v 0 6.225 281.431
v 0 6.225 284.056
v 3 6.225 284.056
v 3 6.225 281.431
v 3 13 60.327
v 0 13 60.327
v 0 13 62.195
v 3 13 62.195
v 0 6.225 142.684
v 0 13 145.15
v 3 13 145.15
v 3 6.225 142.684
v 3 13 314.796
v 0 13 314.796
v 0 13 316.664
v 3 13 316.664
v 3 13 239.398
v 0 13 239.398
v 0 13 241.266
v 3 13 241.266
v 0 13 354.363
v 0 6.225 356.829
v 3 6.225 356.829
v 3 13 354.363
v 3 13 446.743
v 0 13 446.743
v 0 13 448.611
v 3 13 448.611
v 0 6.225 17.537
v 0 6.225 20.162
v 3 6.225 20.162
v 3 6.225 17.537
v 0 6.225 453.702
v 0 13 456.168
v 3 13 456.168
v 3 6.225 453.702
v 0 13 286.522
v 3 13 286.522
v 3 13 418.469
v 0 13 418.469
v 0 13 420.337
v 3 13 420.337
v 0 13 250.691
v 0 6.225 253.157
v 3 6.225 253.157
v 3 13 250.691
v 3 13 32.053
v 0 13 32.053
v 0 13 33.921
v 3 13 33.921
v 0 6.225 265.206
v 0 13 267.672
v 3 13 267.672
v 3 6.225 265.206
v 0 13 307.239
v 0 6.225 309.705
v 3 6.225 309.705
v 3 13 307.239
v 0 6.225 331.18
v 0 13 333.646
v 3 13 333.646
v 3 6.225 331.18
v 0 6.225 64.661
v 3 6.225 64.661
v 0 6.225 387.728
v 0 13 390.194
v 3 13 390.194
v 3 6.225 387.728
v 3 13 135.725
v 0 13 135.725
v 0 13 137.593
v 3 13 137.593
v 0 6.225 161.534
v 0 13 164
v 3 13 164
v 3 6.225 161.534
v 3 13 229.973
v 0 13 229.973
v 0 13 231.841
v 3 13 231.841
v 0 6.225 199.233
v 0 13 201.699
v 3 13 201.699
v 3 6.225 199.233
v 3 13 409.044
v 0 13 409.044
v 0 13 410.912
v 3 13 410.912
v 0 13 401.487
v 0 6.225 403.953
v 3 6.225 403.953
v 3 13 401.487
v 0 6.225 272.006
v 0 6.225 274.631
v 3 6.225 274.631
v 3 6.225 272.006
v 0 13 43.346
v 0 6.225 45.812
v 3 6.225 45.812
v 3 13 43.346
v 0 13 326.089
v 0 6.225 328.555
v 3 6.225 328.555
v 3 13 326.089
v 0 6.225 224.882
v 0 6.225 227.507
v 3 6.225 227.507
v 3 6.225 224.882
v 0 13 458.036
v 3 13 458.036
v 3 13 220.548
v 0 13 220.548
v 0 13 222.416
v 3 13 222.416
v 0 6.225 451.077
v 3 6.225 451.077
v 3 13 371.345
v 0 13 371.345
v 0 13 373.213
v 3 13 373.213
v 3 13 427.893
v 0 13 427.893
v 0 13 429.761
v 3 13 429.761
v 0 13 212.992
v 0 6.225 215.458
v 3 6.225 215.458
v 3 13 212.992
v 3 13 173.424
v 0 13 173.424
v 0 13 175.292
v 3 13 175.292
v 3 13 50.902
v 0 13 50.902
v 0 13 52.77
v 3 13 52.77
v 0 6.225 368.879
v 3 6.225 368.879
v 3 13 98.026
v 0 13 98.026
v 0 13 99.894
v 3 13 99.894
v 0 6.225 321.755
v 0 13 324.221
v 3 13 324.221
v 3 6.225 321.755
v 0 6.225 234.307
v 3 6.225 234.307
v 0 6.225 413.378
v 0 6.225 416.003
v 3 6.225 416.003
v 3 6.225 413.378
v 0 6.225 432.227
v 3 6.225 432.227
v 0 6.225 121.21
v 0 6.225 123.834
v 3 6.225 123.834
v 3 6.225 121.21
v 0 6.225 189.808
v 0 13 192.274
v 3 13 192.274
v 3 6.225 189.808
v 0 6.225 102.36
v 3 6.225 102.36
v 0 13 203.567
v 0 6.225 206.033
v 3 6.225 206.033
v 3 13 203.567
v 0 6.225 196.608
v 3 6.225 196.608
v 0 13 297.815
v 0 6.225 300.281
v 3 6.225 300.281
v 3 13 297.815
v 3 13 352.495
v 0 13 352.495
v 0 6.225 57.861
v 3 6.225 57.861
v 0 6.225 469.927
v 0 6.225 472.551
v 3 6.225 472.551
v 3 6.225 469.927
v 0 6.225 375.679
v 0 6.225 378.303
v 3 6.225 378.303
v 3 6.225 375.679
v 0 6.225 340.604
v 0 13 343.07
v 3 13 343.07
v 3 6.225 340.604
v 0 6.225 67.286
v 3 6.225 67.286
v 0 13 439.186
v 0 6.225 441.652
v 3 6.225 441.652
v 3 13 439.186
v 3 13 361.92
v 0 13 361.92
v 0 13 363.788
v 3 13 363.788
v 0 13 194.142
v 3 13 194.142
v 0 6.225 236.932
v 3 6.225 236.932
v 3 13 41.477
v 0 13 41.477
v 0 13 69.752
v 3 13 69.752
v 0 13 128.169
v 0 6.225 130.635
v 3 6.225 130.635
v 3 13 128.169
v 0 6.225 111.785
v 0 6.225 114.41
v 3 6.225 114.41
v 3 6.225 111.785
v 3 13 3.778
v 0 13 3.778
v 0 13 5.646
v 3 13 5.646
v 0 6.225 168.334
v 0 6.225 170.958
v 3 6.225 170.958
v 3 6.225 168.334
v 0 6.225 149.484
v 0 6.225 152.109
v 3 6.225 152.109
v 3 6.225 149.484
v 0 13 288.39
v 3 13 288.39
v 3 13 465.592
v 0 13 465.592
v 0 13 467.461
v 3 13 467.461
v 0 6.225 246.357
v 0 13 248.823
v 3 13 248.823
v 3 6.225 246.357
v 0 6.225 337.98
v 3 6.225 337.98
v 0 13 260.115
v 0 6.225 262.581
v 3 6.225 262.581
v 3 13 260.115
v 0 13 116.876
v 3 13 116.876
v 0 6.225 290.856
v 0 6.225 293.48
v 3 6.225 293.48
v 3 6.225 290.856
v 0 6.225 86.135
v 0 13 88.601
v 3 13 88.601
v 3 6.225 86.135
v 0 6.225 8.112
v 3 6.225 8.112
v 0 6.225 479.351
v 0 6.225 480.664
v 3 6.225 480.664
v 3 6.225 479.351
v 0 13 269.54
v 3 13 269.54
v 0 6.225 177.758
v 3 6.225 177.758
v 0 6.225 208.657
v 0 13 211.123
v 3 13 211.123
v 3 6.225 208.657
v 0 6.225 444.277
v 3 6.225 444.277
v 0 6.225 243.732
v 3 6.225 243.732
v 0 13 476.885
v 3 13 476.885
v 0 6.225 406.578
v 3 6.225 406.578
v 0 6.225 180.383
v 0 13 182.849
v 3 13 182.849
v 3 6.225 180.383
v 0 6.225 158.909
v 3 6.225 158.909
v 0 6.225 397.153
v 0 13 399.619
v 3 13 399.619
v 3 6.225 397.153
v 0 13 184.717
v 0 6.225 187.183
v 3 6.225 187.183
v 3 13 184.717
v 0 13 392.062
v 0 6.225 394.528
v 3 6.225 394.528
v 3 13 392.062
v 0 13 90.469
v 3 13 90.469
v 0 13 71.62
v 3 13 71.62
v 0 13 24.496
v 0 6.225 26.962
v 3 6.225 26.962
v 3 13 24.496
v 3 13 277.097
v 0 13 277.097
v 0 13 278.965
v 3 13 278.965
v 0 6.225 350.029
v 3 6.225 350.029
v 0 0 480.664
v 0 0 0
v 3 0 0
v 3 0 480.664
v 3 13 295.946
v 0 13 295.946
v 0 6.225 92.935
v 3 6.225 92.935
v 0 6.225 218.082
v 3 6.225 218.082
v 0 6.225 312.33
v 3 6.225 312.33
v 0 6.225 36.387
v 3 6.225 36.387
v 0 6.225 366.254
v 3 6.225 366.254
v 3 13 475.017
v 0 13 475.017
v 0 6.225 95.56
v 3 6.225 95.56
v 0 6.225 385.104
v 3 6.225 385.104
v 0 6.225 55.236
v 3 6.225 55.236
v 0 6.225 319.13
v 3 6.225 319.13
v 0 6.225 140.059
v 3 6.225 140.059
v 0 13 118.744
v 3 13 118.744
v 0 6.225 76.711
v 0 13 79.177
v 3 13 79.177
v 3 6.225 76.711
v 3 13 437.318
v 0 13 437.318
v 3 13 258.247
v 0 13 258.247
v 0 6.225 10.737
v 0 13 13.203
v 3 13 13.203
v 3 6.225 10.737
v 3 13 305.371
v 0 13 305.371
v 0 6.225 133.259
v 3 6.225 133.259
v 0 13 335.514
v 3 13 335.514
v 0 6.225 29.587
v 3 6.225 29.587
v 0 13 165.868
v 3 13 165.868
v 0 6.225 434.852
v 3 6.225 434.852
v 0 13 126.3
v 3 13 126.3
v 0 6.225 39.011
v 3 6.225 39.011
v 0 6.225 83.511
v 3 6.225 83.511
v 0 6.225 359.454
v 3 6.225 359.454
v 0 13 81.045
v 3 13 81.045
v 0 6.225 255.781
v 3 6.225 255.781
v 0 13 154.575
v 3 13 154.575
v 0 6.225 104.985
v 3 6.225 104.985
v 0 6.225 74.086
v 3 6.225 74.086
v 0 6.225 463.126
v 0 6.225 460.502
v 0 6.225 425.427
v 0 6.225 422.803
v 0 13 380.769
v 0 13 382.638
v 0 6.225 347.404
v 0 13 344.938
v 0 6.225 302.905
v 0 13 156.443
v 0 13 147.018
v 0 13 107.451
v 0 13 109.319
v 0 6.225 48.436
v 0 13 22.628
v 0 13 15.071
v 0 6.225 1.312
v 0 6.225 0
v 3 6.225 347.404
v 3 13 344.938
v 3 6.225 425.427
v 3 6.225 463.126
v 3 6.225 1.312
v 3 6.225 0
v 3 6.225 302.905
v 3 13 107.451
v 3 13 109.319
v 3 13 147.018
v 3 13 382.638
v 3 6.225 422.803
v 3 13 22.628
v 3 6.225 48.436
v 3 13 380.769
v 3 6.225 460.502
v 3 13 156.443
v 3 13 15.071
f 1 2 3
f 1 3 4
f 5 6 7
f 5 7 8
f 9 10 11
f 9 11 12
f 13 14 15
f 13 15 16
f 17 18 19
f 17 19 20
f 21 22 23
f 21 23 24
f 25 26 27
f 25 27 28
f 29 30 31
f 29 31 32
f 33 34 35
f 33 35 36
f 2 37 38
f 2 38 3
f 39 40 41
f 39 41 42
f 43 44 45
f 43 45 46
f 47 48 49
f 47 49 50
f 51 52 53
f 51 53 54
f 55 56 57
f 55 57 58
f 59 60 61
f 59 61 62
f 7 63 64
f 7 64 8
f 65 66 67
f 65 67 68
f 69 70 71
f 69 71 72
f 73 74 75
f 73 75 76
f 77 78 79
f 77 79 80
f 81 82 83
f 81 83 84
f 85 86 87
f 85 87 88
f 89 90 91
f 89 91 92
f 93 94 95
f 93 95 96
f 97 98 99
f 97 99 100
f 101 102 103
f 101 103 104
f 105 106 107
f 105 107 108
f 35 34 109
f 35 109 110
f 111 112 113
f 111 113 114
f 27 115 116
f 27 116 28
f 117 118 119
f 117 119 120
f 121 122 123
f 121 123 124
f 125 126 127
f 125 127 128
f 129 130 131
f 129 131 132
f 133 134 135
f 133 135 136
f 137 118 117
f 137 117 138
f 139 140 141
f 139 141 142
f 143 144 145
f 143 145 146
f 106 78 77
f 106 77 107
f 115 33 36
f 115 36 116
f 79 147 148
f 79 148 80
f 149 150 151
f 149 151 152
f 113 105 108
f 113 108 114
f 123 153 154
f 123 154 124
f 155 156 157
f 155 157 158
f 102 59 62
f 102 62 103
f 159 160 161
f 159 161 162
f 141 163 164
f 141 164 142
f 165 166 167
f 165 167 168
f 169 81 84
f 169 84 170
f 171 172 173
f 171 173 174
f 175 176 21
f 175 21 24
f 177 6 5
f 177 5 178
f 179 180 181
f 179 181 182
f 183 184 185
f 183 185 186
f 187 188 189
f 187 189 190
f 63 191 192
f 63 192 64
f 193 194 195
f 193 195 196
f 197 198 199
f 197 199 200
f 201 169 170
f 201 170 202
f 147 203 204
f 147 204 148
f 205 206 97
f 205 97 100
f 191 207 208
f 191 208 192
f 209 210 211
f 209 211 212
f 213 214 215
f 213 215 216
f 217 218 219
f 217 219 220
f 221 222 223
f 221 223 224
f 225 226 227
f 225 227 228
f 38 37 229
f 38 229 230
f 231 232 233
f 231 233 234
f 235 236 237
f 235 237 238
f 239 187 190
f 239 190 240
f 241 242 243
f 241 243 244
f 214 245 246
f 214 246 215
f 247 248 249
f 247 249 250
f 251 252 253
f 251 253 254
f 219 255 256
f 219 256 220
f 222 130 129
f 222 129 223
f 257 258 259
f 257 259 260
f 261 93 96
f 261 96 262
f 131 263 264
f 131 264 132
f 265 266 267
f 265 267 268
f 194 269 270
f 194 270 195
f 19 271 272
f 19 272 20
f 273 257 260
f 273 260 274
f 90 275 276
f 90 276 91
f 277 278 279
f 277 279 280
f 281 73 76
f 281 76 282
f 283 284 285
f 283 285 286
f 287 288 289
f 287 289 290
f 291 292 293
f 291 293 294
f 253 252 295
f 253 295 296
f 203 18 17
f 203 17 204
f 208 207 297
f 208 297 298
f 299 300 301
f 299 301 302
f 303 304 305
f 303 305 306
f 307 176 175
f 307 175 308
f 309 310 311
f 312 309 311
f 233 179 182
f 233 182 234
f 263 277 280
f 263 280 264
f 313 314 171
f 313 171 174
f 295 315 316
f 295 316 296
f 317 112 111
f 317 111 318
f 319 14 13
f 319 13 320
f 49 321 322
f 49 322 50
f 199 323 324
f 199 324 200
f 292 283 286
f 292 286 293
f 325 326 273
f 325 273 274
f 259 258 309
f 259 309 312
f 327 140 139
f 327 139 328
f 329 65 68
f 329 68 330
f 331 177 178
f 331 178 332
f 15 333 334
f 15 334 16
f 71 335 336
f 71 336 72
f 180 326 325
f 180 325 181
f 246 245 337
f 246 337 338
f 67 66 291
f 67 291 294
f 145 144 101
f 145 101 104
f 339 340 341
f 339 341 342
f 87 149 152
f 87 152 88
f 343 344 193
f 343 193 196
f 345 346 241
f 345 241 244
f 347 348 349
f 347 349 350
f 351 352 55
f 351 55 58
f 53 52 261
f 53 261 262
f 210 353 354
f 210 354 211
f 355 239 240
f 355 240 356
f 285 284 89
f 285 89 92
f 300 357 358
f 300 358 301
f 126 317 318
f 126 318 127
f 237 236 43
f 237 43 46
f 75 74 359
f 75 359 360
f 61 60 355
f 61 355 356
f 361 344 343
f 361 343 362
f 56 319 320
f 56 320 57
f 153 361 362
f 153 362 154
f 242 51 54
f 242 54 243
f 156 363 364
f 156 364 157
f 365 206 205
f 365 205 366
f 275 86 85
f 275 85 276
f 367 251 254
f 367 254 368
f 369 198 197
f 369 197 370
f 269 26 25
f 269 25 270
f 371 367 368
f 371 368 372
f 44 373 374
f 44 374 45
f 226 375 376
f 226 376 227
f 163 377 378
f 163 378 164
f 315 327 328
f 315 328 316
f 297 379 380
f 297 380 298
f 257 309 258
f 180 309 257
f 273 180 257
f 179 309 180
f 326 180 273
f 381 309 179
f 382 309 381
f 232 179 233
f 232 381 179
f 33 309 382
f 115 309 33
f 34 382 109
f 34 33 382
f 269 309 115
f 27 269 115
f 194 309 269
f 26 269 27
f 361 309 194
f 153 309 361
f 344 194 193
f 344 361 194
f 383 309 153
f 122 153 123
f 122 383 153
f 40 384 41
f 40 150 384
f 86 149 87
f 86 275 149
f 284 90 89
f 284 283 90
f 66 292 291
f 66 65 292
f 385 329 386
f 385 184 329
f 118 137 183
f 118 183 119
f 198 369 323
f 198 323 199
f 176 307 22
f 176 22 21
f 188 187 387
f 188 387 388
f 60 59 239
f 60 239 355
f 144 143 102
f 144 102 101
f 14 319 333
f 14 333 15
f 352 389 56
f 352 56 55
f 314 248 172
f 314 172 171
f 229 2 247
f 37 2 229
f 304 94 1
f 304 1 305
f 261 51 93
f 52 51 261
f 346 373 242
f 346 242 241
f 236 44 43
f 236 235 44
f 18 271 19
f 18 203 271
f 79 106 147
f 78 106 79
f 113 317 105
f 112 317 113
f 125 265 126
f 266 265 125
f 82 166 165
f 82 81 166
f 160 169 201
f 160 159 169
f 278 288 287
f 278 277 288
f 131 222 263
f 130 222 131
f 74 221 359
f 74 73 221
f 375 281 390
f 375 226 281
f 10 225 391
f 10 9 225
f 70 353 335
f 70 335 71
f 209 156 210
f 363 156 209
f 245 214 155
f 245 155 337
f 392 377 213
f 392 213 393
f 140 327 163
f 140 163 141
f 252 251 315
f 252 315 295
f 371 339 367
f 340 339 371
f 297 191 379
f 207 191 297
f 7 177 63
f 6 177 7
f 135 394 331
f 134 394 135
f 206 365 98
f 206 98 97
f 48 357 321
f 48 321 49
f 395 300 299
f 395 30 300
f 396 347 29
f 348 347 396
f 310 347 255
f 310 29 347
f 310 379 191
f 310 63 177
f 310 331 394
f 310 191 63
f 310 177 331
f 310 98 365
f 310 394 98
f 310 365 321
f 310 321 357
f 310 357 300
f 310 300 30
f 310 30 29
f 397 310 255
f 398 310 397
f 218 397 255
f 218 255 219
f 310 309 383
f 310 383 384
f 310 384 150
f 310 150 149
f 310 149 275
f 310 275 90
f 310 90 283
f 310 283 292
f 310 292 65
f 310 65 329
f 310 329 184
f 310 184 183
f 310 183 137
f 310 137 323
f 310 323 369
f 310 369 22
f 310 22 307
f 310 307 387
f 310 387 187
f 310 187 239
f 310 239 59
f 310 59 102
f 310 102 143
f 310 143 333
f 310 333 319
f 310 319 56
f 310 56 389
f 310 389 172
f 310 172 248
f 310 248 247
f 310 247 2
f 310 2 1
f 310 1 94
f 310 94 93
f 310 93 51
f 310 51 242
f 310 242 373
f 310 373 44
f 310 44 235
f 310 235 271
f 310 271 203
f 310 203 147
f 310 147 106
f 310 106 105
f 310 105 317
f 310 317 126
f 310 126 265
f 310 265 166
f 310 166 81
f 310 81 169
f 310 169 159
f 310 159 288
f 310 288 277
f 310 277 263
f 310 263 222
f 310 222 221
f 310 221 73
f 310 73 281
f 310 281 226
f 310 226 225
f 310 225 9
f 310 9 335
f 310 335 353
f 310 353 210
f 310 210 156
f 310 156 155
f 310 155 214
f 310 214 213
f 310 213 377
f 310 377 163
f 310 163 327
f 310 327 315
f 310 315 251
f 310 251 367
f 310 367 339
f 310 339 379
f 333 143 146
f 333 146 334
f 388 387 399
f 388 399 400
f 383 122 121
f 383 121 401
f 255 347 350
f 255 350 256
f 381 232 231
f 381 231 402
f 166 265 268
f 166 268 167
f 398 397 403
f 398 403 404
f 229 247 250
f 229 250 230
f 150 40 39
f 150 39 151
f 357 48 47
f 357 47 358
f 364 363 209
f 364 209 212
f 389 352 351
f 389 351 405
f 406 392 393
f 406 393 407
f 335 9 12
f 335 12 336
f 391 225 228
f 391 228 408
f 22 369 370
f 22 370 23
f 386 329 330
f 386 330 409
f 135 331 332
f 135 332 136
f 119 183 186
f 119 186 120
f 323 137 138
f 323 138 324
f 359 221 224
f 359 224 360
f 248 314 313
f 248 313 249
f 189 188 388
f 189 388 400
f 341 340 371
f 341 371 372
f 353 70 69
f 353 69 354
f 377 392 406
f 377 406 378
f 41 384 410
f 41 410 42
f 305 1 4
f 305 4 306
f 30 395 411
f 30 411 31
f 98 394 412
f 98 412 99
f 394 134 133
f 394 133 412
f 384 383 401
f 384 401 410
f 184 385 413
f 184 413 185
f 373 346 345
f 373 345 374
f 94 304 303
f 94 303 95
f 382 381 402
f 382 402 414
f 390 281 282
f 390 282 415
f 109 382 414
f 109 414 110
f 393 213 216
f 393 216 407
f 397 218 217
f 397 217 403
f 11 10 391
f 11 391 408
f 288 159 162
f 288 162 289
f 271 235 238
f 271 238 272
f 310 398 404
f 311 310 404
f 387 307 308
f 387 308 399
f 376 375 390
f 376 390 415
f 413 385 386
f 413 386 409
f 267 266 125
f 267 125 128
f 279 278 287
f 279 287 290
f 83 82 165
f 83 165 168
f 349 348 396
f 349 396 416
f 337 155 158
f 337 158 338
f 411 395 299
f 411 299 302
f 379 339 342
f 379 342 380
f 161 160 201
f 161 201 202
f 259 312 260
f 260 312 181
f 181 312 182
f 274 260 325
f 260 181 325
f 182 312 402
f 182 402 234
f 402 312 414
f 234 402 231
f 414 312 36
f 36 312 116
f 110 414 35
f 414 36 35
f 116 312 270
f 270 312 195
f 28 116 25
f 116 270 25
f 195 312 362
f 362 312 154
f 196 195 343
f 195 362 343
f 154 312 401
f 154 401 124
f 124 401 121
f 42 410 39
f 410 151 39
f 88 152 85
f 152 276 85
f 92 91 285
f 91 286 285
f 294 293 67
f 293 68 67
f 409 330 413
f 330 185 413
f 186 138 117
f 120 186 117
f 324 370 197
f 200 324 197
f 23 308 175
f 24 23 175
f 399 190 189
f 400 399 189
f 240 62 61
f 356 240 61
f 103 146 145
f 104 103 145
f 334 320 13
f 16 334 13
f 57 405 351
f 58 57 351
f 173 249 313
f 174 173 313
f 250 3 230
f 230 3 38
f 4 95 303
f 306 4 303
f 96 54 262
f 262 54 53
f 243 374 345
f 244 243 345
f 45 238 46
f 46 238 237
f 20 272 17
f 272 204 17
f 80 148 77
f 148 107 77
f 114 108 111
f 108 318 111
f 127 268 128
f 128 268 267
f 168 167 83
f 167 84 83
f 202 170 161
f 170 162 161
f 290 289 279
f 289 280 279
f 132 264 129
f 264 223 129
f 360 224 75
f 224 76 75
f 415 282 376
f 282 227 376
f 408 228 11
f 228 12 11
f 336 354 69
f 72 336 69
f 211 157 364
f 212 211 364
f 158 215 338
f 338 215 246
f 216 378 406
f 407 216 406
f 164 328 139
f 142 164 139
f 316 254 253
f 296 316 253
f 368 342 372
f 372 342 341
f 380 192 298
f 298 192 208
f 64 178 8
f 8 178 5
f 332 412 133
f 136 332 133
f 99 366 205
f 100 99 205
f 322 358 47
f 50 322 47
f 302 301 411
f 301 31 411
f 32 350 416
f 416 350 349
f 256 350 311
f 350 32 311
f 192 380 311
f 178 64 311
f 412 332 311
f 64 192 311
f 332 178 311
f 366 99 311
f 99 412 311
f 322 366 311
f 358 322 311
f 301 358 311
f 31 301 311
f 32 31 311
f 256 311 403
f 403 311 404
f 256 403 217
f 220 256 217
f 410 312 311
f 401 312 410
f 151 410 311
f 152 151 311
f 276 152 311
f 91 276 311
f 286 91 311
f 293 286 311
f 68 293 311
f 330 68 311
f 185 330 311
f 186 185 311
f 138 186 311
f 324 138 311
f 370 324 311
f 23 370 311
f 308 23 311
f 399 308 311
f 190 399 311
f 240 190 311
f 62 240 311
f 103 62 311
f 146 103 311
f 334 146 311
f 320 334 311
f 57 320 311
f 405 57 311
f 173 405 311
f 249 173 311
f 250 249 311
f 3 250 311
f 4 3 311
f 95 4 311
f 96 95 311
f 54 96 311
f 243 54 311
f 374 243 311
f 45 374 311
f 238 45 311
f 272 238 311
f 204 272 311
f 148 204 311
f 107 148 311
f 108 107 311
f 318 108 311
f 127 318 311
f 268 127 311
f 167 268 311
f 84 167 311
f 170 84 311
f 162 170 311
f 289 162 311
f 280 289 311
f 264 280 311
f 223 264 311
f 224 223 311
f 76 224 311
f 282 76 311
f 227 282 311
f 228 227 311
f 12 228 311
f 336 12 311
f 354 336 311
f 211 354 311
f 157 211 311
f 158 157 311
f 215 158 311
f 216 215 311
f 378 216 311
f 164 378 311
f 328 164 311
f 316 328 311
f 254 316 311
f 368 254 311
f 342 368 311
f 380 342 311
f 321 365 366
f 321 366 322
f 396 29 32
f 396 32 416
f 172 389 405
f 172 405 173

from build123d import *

# Parameters (mm, degrees)
ESBO_O1_W                = 3
ESBO_O1_H                = 13
RESSALTO_EXTRUS_O1_DEPTH = 480.664
CORTE_EXTRUS_O1_DEPTH    = 481.849124878


with BuildPart() as part:
    # Esboço1 → Ressalto-extrusão1 (new body)
    with BuildSketch(Plane.XY):
        with Locations((1.5, 6.5)):
            Rectangle(ESBO_O1_W, ESBO_O1_H)
    extrude(amount=RESSALTO_EXTRUS_O1_DEPTH)

    # Esboço2 → Corte-extrusão1 (cut, through all)
    with BuildSketch(Plane.ZY):
        Polygon((1.312306109, 6.2246), (-1.312306109, 6.2246), (-3.778350034, 13), (3.778350034, 13), align=None)
        Polygon((10.737084059, 6.2246), (8.112471841, 6.2246), (5.646427916, 13), (13.203127984, 13), align=None)
        Polygon((20.161862009, 6.2246), (17.537249791, 6.2246), (15.071205866, 13), (22.627905934, 13), align=None)
        Polygon((29.586639959, 6.2246), (26.962027741, 6.2246), (24.495983816, 13), (32.052683884, 13), align=None)
        Polygon((39.011417909, 6.2246), (36.386805691, 6.2246), (33.920761766, 13), (41.477461834, 13), align=None)
        Polygon((48.436195859, 6.2246), (45.811583641, 6.2246), (43.345539716, 13), (50.902239784, 13), align=None)
        Polygon((57.860973809, 6.2246), (55.236361591, 6.2246), (52.770317666, 13), (60.327017734, 13), align=None)
        Polygon((67.285751759, 6.2246), (64.661139541, 6.2246), (62.195095616, 13), (69.751795684, 13), align=None)
        Polygon((76.710529709, 6.2246), (74.085917491, 6.2246), (71.619873566, 13), (79.176573634, 13), align=None)
        Polygon((86.135307659, 6.2246), (83.510695441, 6.2246), (81.044651516, 13), (88.601351584, 13), align=None)
        Polygon((95.560085609, 6.2246), (92.935473391, 6.2246), (90.469429466, 13), (98.026129534, 13), align=None)
        Polygon((104.984863559, 6.2246), (102.360251341, 6.2246), (99.894207416, 13), (107.450907484, 13), align=None)
        Polygon((114.409641509, 6.2246), (111.785029291, 6.2246), (109.318985366, 13), (116.875685434, 13), align=None)
        Polygon((123.834419459, 6.2246), (121.209807241, 6.2246), (118.743763316, 13), (126.300463384, 13), align=None)
        Polygon((133.259197409, 6.2246), (130.634585191, 6.2246), (128.168541266, 13), (135.725241334, 13), align=None)
        Polygon((142.683975359, 6.2246), (140.059363141, 6.2246), (137.593319216, 13), (145.150019284, 13), align=None)
        Polygon((152.108753309, 6.2246), (149.484141091, 6.2246), (147.018097166, 13), (154.574797234, 13), align=None)
        Polygon((161.533531259, 6.2246), (158.908919041, 6.2246), (156.442875116, 13), (163.999575184, 13), align=None)
        Polygon((170.958309209, 6.2246), (168.333696991, 6.2246), (165.867653066, 13), (173.424353134, 13), align=None)
        Polygon((180.383087159, 6.2246), (177.758474941, 6.2246), (175.292431016, 13), (182.849131084, 13), align=None)
        Polygon((189.807865109, 6.2246), (187.183252891, 6.2246), (184.717208966, 13), (192.273909034, 13), align=None)
        Polygon((199.232643059, 6.2246), (196.608030841, 6.2246), (194.141986916, 13), (201.698686984, 13), align=None)
        Polygon((208.657421009, 6.2246), (206.032808791, 6.2246), (203.566764866, 13), (211.123464934, 13), align=None)
        Polygon((218.082198959, 6.2246), (215.457586741, 6.2246), (212.991542816, 13), (220.548242884, 13), align=None)
        Polygon((227.506976909, 6.2246), (224.882364691, 6.2246), (222.416320766, 13), (229.973020834, 13), align=None)
        Polygon((236.931754859, 6.2246), (234.307142641, 6.2246), (231.841098716, 13), (239.397798784, 13), align=None)
        Polygon((246.356532809, 6.2246), (243.731920591, 6.2246), (241.265876666, 13), (248.822576734, 13), align=None)
        Polygon((255.781310759, 6.2246), (253.156698541, 6.2246), (250.690654616, 13), (258.247354684, 13), align=None)
        Polygon((265.206088709, 6.2246), (262.581476491, 6.2246), (260.115432566, 13), (267.672132634, 13), align=None)
        Polygon((274.630866659, 6.2246), (272.006254441, 6.2246), (269.540210516, 13), (277.096910584, 13), align=None)
        Polygon((284.055644609, 6.2246), (281.431032391, 6.2246), (278.964988466, 13), (286.521688534, 13), align=None)
        Polygon((293.480422559, 6.2246), (290.855810341, 6.2246), (288.389766416, 13), (295.946466484, 13), align=None)
        Polygon((302.905200509, 6.2246), (300.280588291, 6.2246), (297.814544366, 13), (305.371244434, 13), align=None)
        Polygon((312.329978459, 6.2246), (309.705366241, 6.2246), (307.239322316, 13), (314.796022384, 13), align=None)
        Polygon((321.754756409, 6.2246), (319.130144191, 6.2246), (316.664100266, 13), (324.220800334, 13), align=None)
        Polygon((331.179534359, 6.2246), (328.554922141, 6.2246), (326.088878216, 13), (333.645578284, 13), align=None)
        Polygon((340.604312309, 6.2246), (337.979700091, 6.2246), (335.513656166, 13), (343.070356234, 13), align=None)
        Polygon((350.029090259, 6.2246), (347.404478041, 6.2246), (344.938434116, 13), (352.495134184, 13), align=None)
        Polygon((359.453868209, 6.2246), (356.829255991, 6.2246), (354.363212066, 13), (361.919912134, 13), align=None)
        Polygon((368.878646159, 6.2246), (366.254033941, 6.2246), (363.787990016, 13), (371.344690084, 13), align=None)
        Polygon((378.303424109, 6.2246), (375.678811891, 6.2246), (373.212767966, 13), (380.769468034, 13), align=None)
        Polygon((387.728202059, 6.2246), (385.103589841, 6.2246), (382.637545916, 13), (390.194245984, 13), align=None)
        Polygon((397.152980009, 6.2246), (394.528367791, 6.2246), (392.062323866, 13), (399.619023934, 13), align=None)
        Polygon((406.577757959, 6.2246), (403.953145741, 6.2246), (401.487101816, 13), (409.043801884, 13), align=None)
        Polygon((416.002535909, 6.2246), (413.377923691, 6.2246), (410.911879766, 13), (418.468579834, 13), align=None)
        Polygon((425.427313859, 6.2246), (422.802701641, 6.2246), (420.336657716, 13), (427.893357784, 13), align=None)
        Polygon((434.852091809, 6.2246), (432.227479591, 6.2246), (429.761435666, 13), (437.318135734, 13), align=None)
        Polygon((444.276869759, 6.2246), (441.652257541, 6.2246), (439.186213616, 13), (446.742913684, 13), align=None)
        Polygon((453.701647709, 6.2246), (451.077035491, 6.2246), (448.610991566, 13), (456.167691634, 13), align=None)
        Polygon((463.126425659, 6.2246), (460.501813441, 6.2246), (458.035769516, 13), (465.592469584, 13), align=None)
        Polygon((472.551203609, 6.2246), (469.926591391, 6.2246), (467.460547466, 13), (475.017247534, 13), align=None)
        Polygon((481.975981559, 6.2246), (479.351369341, 6.2246), (476.885325416, 13), (484.442025484, 13), align=None)
    extrude(amount=-CORTE_EXTRUS_O1_DEPTH, mode=Mode.SUBTRACT)


solid = part.part
